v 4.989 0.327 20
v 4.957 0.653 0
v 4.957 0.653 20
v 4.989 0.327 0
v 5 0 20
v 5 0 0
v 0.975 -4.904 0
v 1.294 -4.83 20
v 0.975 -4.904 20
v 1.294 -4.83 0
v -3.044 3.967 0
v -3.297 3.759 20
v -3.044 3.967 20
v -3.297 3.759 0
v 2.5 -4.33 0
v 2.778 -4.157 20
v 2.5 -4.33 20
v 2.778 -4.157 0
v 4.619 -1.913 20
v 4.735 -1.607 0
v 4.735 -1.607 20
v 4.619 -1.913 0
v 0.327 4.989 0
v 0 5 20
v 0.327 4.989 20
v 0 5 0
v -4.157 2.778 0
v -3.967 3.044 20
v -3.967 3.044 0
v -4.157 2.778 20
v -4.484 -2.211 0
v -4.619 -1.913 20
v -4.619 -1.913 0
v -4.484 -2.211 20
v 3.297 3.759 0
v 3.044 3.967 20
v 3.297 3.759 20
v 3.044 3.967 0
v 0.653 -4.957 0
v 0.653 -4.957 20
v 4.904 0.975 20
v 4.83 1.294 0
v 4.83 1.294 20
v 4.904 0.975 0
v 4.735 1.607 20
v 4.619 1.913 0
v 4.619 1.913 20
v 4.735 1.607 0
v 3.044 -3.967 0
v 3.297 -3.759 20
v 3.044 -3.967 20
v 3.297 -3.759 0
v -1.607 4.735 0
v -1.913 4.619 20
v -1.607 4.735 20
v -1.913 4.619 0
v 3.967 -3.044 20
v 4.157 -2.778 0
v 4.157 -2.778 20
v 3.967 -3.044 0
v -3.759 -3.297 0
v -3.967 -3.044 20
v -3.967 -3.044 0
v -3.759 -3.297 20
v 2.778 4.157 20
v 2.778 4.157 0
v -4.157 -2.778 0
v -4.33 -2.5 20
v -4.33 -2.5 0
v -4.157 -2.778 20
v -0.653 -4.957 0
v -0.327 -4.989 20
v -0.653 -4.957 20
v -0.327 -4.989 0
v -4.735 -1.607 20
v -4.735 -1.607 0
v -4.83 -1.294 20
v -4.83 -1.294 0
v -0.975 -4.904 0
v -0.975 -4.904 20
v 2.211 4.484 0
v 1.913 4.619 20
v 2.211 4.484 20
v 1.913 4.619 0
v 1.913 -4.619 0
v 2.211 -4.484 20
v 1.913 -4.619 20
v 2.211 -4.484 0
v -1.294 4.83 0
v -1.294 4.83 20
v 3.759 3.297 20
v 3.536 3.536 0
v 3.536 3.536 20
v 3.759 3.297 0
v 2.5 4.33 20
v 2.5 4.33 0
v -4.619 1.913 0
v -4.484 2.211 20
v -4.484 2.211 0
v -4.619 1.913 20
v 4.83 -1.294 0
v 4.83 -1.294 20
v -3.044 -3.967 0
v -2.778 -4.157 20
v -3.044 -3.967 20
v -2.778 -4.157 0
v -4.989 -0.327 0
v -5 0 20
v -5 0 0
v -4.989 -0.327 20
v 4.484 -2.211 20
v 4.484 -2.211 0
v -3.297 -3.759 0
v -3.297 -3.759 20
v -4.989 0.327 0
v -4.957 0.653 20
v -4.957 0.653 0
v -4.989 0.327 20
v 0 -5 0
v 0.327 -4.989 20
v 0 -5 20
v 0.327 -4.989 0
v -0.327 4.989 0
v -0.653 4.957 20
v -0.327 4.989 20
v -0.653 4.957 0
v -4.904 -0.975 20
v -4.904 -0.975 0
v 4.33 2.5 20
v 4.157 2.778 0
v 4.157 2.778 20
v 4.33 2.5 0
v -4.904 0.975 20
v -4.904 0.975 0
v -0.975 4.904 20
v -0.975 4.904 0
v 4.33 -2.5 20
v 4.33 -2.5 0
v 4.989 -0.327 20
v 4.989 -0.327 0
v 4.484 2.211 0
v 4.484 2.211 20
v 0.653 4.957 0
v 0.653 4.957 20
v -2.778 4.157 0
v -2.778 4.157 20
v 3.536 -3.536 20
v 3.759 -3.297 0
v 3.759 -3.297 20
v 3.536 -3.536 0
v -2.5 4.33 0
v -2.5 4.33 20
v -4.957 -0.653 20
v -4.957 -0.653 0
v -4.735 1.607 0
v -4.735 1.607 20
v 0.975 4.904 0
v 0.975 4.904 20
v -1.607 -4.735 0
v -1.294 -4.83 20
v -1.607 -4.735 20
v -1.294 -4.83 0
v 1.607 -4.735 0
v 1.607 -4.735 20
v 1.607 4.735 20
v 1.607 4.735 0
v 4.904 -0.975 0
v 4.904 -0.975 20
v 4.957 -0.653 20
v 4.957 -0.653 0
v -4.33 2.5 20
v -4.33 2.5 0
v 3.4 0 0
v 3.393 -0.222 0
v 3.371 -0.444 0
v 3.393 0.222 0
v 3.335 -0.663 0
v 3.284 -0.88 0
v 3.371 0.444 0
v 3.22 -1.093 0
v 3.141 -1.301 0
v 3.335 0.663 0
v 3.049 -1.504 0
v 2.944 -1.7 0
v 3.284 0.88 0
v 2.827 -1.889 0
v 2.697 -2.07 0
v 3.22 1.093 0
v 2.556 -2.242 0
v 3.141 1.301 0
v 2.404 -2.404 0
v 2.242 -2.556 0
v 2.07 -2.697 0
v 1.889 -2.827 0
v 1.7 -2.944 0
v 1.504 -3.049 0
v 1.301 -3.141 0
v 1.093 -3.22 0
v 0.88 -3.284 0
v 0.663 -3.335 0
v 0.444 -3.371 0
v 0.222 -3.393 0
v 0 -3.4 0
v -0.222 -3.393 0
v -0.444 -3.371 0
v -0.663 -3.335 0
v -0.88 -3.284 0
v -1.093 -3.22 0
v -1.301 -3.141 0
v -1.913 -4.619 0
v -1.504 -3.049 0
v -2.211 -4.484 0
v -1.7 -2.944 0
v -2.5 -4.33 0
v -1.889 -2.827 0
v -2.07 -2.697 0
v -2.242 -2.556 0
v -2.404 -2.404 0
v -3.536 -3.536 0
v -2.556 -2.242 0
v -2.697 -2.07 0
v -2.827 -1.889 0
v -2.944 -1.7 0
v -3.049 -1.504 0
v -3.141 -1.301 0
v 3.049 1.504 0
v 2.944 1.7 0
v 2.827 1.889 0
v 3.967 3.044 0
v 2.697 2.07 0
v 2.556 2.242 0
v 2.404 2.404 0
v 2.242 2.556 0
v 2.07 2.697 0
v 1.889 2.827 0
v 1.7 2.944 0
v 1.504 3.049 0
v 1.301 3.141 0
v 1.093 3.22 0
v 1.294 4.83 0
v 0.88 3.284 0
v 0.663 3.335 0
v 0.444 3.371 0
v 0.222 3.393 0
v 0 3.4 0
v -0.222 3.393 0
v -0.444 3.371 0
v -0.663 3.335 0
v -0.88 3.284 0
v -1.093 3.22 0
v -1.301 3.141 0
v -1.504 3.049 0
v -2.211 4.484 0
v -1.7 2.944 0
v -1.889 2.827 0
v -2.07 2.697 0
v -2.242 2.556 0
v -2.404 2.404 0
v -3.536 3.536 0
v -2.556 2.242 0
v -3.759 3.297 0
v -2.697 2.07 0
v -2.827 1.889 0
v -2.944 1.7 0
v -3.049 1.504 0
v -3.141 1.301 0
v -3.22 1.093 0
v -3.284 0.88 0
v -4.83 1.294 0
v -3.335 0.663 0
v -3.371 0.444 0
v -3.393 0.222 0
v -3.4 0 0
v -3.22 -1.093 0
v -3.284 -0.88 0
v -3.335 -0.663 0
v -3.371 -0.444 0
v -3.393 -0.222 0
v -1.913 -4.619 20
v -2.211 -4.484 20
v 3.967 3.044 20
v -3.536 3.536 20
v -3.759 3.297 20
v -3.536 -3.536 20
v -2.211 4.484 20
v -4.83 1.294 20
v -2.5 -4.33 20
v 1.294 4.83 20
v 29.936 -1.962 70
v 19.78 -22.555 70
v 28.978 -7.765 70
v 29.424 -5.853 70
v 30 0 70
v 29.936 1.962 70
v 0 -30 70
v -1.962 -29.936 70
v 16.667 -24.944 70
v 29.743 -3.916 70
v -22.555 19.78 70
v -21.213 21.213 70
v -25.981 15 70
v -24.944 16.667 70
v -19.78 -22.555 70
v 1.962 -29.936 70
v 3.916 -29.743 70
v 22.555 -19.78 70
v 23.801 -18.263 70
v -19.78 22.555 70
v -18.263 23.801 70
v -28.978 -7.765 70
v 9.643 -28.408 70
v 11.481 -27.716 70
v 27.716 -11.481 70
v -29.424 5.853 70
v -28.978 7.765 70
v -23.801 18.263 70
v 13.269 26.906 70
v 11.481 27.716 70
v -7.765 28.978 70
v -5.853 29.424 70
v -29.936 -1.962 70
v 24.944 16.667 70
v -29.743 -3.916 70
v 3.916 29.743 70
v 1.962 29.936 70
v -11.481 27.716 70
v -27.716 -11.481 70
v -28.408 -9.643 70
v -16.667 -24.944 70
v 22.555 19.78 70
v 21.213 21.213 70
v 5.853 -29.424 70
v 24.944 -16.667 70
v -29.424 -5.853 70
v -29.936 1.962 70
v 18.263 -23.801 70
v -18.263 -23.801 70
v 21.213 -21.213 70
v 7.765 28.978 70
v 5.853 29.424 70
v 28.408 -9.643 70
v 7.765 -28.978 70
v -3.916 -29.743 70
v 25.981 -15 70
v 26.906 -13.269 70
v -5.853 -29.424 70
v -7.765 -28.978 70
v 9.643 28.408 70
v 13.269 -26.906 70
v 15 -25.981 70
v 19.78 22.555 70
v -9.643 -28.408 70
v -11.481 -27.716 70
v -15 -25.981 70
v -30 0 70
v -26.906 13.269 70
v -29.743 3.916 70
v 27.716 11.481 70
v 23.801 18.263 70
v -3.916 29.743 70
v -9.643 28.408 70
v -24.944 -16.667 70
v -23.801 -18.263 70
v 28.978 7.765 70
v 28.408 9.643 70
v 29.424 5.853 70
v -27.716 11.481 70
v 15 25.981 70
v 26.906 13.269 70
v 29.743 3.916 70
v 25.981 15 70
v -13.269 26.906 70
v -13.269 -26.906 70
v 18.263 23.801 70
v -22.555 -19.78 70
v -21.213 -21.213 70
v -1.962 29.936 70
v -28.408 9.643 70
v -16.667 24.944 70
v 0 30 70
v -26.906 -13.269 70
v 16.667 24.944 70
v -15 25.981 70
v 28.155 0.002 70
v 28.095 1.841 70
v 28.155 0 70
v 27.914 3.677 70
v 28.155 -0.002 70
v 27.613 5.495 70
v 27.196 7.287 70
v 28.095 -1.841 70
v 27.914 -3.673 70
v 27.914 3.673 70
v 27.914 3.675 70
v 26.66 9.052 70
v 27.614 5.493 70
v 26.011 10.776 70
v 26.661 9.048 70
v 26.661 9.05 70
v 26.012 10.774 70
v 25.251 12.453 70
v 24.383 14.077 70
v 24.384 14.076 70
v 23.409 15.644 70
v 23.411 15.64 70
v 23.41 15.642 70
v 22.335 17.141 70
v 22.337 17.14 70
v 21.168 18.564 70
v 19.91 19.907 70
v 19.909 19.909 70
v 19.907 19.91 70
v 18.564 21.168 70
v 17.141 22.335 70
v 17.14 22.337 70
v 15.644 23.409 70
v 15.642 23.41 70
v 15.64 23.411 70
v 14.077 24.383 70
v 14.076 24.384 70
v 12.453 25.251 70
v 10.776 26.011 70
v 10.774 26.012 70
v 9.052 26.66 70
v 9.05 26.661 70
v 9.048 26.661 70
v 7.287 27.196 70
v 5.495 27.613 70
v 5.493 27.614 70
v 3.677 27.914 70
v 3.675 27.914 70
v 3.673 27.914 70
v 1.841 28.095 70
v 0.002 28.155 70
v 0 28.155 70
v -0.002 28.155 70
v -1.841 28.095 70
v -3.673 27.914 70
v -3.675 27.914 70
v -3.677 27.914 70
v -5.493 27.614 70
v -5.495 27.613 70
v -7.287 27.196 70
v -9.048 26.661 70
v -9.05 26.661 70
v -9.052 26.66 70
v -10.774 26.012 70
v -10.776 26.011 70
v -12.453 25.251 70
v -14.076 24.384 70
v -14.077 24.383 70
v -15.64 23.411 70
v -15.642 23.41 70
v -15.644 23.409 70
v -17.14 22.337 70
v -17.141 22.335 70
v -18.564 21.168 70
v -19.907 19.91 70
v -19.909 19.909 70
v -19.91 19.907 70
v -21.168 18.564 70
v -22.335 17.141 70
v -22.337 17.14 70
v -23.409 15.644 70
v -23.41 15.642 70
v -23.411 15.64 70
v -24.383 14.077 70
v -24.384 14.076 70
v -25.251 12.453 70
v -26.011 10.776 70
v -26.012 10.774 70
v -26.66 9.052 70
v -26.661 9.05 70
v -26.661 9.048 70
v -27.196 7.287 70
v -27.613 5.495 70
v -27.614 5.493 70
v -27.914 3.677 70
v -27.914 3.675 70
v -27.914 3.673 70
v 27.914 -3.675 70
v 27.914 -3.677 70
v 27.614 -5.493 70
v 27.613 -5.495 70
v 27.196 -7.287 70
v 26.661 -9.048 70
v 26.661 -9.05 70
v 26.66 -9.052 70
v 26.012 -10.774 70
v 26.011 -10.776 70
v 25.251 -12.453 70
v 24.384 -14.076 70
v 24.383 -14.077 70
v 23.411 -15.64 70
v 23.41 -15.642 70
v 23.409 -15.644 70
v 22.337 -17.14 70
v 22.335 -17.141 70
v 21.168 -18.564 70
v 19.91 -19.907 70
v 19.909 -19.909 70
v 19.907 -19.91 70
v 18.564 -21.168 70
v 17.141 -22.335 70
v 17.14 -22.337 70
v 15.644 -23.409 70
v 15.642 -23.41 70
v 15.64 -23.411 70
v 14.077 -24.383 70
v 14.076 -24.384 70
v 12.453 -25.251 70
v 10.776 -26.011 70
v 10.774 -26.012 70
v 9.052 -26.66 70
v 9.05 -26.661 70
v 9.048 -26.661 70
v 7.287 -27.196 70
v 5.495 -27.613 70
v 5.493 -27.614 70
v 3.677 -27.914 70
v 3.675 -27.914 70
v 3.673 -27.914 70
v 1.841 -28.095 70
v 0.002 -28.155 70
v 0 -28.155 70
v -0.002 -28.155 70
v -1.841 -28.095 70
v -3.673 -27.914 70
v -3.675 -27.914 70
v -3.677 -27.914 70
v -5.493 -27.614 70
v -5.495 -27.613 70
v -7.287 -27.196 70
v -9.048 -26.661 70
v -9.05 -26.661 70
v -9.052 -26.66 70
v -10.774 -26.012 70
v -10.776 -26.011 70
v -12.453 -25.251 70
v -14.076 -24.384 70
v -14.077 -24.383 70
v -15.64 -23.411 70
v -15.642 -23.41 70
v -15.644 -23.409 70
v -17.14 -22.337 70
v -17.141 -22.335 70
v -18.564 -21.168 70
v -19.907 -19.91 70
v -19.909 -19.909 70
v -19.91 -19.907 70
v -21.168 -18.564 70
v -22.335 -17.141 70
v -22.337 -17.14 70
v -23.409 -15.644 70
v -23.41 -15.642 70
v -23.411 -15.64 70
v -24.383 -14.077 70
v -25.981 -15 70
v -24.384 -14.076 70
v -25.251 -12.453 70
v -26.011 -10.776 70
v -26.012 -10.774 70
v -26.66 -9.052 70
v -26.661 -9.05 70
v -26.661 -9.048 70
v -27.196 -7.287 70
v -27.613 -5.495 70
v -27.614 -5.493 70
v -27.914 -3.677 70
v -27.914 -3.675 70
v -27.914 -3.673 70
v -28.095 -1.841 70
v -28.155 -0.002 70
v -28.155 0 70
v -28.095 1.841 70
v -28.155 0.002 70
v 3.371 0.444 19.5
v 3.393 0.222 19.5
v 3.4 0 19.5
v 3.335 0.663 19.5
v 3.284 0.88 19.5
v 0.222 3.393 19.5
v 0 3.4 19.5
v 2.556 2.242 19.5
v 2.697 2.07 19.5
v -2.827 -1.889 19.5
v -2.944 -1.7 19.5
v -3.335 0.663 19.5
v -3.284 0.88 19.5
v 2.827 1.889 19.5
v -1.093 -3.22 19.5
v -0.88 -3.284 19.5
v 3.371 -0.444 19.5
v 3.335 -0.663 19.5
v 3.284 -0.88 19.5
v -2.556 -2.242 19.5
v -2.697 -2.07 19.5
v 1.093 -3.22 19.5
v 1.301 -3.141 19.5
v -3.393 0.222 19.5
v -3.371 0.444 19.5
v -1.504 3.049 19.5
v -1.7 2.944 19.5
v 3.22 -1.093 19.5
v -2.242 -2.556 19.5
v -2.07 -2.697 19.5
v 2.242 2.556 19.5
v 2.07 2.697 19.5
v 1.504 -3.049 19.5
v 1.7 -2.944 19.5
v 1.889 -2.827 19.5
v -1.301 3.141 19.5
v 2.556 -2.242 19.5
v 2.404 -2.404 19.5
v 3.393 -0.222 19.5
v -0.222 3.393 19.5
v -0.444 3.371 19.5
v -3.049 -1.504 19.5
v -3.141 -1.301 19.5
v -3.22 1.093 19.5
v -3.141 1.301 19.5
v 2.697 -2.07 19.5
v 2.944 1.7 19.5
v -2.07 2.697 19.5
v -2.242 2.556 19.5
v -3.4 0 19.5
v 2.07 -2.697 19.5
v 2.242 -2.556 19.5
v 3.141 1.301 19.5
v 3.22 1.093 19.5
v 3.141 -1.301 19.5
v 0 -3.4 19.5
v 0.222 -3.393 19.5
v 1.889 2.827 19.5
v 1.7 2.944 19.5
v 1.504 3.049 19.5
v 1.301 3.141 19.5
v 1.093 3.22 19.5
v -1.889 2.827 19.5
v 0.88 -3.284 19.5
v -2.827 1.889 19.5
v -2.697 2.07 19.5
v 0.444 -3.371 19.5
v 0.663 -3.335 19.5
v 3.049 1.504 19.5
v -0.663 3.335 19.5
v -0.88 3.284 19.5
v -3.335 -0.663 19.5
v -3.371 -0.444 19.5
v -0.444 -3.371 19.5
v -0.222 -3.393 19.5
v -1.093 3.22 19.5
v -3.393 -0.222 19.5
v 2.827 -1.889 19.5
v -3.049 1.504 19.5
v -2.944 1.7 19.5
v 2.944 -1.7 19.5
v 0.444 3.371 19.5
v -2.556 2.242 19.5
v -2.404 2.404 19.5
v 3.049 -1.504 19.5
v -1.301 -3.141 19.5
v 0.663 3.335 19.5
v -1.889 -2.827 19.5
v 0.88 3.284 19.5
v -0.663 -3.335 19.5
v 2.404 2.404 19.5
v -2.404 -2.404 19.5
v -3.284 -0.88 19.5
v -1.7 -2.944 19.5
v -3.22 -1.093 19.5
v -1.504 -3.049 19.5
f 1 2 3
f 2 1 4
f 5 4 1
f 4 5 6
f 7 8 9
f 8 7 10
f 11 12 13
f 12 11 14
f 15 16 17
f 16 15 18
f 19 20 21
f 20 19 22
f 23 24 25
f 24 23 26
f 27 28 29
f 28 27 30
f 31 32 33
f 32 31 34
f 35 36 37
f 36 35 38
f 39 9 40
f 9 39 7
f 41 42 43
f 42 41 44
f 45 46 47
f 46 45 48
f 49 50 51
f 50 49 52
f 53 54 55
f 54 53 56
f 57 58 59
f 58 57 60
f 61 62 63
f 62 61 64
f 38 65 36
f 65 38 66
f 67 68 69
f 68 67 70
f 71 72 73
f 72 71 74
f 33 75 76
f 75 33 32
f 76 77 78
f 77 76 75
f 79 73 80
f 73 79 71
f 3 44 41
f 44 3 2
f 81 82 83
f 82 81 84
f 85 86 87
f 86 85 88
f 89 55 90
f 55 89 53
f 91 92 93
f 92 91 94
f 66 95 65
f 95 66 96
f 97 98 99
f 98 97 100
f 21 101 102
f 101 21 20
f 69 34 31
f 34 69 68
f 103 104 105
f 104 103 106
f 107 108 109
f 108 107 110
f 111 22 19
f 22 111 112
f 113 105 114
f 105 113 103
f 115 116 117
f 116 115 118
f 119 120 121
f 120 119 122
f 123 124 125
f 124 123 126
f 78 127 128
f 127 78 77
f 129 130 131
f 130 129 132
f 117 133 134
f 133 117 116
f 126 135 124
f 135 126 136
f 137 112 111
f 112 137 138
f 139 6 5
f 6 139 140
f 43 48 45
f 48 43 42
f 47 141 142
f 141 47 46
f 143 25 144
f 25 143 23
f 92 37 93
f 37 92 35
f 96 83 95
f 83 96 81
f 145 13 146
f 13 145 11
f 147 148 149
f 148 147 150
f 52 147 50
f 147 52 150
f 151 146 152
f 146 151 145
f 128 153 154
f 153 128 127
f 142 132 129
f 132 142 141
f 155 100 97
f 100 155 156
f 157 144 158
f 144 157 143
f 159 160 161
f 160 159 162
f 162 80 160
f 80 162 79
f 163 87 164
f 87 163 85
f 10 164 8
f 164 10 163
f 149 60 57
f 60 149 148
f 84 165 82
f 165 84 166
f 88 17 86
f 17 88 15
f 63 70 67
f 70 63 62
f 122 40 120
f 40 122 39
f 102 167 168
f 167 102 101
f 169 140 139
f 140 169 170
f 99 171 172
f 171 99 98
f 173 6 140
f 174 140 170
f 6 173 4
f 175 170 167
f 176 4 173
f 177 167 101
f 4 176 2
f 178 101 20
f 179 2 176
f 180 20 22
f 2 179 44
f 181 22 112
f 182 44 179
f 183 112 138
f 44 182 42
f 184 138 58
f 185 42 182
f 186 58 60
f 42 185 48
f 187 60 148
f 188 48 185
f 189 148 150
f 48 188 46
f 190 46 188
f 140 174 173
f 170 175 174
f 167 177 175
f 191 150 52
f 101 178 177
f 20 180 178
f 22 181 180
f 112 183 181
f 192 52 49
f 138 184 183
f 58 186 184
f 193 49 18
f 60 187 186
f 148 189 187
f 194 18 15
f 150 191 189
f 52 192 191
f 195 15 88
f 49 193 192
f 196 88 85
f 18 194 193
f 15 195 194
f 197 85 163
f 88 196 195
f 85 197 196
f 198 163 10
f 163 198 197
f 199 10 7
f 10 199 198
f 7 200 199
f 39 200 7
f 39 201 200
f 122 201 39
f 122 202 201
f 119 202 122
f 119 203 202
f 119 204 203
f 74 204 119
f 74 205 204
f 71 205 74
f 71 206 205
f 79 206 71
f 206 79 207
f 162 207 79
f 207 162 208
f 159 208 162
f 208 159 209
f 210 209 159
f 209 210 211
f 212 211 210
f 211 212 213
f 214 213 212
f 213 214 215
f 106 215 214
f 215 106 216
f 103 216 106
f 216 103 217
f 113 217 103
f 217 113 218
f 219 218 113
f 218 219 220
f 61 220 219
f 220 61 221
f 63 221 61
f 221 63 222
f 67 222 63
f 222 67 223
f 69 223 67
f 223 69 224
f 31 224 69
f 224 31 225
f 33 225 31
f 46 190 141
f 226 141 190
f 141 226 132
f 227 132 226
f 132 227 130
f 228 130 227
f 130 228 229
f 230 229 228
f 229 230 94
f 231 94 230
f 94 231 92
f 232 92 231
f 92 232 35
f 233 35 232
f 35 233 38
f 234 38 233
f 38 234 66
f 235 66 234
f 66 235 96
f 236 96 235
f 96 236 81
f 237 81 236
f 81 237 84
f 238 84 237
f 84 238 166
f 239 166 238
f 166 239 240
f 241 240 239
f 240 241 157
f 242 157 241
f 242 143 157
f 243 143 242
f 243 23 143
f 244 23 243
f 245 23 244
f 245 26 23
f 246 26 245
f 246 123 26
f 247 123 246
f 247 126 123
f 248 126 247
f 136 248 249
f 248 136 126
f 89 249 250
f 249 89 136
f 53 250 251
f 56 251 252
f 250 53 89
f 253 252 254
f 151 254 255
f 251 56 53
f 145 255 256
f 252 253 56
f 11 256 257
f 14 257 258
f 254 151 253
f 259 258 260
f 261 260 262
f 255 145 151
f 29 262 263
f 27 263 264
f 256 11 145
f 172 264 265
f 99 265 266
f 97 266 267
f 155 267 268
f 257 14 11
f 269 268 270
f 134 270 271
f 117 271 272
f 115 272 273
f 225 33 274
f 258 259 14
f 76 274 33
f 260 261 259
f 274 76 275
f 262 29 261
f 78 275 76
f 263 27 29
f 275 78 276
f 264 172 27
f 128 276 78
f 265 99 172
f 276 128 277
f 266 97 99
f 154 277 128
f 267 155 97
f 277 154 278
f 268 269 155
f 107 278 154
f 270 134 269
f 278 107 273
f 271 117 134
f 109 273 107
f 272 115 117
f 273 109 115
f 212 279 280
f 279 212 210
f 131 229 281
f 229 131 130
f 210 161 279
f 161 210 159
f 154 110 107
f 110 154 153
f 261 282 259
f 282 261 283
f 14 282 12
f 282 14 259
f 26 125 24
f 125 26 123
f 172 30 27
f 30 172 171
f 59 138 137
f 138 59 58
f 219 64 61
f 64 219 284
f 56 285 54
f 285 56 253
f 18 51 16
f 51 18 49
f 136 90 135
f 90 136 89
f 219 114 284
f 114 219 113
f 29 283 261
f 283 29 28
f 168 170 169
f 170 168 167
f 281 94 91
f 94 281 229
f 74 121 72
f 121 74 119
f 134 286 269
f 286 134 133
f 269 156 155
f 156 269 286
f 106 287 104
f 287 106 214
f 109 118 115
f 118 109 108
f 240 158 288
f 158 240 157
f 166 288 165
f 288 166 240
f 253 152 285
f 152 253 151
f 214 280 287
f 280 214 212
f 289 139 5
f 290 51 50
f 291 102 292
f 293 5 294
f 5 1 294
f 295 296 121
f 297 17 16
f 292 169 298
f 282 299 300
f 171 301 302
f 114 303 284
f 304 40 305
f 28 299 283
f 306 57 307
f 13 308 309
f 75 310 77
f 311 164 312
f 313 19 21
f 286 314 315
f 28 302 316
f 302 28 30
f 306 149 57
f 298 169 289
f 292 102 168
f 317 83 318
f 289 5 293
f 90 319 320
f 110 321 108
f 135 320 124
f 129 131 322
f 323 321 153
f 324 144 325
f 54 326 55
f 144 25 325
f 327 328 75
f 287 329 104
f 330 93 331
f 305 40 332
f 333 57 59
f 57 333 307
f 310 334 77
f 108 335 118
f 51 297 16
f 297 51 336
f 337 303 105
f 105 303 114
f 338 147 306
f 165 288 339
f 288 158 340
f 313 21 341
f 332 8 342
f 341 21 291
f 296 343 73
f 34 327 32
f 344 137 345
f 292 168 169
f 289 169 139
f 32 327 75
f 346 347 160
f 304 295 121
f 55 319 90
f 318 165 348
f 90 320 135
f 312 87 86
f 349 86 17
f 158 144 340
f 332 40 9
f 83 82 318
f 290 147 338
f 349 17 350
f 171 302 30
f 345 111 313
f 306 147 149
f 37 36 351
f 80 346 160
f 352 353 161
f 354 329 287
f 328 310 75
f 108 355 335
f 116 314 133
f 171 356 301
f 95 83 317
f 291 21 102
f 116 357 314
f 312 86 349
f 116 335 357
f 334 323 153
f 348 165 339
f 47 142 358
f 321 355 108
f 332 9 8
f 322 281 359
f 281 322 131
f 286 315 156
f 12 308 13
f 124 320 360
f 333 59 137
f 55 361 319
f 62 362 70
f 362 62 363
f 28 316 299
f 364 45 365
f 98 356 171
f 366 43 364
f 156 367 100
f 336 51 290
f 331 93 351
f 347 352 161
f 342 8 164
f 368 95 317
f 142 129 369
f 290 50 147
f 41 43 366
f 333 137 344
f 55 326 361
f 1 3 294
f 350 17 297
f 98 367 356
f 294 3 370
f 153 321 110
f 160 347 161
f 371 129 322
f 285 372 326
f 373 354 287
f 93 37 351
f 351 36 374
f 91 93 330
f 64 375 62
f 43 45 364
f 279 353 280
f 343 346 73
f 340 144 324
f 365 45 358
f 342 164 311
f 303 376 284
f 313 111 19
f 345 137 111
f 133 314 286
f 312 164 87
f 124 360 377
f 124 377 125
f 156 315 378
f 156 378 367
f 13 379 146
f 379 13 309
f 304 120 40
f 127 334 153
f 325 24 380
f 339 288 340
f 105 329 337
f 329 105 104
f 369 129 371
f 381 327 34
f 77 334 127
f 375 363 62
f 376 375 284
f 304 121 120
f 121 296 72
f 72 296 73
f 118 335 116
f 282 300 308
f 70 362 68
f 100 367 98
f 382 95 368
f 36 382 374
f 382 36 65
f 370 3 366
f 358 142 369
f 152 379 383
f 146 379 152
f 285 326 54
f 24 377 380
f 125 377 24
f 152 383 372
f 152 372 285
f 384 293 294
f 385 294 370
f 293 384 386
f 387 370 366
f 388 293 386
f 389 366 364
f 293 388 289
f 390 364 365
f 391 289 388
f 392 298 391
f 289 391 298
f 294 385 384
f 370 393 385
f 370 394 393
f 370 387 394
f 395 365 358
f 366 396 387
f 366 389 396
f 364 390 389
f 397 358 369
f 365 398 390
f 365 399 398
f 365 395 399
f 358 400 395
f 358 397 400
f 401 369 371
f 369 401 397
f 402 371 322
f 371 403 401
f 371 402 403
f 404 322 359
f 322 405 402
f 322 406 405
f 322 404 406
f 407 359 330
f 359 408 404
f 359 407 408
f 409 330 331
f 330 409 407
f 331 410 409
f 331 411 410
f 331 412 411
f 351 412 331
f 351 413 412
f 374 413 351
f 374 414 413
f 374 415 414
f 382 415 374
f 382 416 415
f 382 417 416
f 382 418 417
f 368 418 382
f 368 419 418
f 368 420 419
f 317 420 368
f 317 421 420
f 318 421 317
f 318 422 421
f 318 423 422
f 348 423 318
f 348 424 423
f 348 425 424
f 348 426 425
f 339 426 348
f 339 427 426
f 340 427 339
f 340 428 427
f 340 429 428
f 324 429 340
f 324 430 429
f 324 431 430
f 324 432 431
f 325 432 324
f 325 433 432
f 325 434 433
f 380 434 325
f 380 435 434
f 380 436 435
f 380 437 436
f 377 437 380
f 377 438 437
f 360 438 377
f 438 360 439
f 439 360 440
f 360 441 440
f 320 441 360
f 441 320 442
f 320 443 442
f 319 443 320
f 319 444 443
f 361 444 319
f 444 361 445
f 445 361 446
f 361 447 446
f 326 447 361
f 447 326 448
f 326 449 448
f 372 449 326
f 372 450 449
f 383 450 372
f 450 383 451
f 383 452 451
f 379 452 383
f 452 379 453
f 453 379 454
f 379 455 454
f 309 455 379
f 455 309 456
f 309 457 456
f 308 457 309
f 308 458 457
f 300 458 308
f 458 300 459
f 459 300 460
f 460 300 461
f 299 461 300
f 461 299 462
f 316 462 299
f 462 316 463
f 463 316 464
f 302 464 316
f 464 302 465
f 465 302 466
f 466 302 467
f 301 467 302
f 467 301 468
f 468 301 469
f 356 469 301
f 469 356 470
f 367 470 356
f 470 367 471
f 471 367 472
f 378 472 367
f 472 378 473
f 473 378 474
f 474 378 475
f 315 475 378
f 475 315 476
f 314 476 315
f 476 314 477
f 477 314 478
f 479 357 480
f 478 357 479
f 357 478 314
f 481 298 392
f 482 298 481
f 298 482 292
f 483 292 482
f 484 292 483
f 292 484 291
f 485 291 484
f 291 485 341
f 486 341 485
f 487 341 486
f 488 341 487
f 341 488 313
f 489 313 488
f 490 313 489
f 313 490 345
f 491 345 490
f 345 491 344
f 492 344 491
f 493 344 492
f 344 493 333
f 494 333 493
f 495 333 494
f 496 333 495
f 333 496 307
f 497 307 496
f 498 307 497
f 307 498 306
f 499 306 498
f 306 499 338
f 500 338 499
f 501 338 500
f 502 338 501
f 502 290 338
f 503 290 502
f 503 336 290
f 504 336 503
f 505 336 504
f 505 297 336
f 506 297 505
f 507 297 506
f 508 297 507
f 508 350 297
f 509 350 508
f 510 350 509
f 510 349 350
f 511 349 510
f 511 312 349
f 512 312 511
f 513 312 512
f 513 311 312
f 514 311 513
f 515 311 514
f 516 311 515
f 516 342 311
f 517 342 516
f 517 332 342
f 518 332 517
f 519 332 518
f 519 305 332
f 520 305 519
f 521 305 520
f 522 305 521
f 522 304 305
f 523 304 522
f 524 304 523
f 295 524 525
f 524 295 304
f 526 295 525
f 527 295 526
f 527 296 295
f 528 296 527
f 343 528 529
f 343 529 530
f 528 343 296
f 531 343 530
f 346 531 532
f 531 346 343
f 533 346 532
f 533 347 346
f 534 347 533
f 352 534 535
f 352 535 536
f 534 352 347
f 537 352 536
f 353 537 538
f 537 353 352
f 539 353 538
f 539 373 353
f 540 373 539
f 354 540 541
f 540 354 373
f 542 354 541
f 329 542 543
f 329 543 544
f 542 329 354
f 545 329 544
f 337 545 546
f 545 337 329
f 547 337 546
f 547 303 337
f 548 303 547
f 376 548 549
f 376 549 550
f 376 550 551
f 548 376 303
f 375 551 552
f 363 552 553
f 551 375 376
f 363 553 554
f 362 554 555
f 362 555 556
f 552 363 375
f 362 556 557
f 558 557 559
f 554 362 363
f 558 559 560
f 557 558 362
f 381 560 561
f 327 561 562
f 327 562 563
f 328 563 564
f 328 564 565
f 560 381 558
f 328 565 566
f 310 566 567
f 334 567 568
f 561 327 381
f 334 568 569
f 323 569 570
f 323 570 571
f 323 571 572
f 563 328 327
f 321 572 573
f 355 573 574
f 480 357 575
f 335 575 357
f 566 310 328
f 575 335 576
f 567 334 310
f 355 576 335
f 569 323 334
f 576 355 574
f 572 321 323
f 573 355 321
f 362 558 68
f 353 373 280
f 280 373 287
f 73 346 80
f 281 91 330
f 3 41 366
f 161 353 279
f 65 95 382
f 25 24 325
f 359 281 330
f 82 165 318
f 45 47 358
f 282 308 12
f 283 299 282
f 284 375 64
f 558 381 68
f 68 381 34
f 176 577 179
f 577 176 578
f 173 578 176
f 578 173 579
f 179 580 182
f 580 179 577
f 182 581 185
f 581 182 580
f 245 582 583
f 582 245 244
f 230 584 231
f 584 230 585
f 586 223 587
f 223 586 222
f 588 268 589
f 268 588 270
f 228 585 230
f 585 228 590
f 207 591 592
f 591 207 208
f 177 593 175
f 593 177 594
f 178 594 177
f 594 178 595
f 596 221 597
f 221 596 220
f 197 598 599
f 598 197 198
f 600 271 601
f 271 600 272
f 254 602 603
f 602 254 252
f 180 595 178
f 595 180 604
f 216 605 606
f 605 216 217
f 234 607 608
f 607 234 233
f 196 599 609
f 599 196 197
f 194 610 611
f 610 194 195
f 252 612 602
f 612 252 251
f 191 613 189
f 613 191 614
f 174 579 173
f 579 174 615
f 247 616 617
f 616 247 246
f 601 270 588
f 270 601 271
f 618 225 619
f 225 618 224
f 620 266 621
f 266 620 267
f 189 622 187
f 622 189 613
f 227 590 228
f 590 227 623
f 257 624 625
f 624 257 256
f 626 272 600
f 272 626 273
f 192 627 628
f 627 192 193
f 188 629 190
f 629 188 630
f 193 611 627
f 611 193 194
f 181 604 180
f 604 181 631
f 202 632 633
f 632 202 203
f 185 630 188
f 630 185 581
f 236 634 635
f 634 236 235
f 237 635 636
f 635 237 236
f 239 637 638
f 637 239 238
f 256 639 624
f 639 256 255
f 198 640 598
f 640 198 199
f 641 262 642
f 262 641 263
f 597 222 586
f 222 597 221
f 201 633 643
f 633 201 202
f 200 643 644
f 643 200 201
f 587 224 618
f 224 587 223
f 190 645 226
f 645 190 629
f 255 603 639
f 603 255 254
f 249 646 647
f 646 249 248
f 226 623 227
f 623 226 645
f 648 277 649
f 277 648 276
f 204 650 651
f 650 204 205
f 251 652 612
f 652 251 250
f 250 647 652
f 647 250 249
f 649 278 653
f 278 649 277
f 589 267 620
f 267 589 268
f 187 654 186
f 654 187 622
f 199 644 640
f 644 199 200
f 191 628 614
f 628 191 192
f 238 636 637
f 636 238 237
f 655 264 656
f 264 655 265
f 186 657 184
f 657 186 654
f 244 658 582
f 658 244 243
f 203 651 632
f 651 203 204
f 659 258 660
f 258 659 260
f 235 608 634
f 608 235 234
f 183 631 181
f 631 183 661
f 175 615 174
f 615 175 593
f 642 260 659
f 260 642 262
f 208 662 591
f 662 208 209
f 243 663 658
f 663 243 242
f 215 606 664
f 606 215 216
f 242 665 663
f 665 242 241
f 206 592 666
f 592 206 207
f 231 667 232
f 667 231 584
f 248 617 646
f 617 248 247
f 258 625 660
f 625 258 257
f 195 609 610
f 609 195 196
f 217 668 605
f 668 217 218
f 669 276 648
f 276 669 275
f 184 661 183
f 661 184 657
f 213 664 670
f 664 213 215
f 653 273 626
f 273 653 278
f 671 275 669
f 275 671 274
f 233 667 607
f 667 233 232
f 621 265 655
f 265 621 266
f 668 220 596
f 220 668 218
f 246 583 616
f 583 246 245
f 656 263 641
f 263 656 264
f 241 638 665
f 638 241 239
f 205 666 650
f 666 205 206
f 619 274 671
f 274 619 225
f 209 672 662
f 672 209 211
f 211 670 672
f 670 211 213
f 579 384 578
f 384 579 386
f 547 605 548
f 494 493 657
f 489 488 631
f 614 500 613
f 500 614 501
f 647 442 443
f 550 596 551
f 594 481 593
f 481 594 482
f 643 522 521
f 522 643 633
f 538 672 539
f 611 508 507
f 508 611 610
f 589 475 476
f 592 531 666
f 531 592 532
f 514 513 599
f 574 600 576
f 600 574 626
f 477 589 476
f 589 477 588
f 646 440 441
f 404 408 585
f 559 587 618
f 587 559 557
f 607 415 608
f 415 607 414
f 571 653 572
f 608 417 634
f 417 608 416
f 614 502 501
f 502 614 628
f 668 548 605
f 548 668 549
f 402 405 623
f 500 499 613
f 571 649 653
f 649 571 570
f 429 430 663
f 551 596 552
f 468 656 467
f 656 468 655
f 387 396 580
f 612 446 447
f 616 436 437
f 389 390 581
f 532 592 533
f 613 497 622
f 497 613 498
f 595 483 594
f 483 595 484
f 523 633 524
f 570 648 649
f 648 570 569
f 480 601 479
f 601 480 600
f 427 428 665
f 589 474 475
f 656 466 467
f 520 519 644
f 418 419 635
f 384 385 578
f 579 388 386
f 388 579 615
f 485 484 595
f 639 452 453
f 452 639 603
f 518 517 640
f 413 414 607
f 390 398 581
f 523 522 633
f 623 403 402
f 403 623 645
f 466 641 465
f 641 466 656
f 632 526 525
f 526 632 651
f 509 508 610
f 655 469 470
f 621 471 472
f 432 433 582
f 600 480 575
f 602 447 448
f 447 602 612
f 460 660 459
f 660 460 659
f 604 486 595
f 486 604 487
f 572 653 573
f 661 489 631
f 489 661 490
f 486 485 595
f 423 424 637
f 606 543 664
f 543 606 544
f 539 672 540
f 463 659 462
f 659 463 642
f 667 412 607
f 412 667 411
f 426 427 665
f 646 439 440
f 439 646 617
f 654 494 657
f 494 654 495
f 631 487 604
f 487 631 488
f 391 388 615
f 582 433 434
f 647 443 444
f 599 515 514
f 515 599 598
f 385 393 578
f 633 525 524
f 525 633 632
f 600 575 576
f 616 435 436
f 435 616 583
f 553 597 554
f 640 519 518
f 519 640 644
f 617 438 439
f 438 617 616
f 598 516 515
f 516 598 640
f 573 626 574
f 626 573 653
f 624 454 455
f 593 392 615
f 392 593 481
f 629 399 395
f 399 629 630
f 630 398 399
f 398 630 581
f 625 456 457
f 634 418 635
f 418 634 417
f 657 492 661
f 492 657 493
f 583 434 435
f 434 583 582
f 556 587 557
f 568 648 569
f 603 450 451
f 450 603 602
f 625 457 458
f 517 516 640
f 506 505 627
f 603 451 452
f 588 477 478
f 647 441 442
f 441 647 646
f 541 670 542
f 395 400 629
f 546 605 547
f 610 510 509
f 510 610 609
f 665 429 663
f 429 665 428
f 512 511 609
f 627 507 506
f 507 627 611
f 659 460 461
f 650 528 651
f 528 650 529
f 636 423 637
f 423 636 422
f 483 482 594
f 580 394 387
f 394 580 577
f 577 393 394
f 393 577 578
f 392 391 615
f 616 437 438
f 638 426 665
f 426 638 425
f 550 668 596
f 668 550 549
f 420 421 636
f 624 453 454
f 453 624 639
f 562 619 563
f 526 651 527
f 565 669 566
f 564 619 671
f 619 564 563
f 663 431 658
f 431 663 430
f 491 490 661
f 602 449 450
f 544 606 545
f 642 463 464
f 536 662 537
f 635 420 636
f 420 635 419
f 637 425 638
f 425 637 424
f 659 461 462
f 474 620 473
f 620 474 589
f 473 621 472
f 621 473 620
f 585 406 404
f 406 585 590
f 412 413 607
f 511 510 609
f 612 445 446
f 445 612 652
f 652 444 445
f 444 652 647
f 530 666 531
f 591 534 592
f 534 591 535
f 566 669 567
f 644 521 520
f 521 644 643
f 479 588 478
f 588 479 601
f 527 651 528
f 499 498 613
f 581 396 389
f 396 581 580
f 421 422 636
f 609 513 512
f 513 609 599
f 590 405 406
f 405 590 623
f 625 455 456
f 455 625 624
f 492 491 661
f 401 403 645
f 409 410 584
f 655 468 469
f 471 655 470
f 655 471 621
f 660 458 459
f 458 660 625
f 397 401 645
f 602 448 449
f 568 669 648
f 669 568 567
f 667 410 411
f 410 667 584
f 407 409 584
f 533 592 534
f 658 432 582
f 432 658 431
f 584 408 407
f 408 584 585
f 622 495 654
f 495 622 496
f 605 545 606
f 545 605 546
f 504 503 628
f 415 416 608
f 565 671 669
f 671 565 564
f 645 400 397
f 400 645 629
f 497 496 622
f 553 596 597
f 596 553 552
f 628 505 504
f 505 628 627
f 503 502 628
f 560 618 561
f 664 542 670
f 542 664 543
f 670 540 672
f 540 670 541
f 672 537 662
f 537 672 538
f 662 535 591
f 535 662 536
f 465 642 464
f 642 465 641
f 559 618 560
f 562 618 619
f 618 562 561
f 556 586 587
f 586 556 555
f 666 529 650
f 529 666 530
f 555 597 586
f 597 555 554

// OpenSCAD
// Lab funnel - printed upright, open top and bottom
// Units: mm

// ---- Parameters ----
spout_od      = 10;    // spout outer diameter
spout_length  = 20;    // spout runs from z = 0 to z = 20
cone_top_d    = 60;    // cone rim diameter at z = 50
cone_bottom_d = 10;    // cone diameter where it meets the spout (z = 20)
wall          = 1.6;   // wall thickness everywhere
eps           = 0.5;   // cutter overshoot past faces

$fn = 96;

// ---- Model ----
difference() {
    union() {
        // Straight spout (tube)
        cylinder(d = spout_od, h = spout_length);
        // Cone from z = 20 to z = 50
        translate([0, 0, spout_length])
            cylinder(d1 = cone_bottom_d, d2 = cone_top_d, h = cone_top_d - cone_bottom_d);
    }
    // Through-bore: spout bore + cone bore (open bottom)
    translate([0, 0, -eps])
        cylinder(h = spout_length + 2 * eps, d = spout_od - 2 * wall);
    translate([0, 0, spout_length - eps])
        cylinder(h = (cone_top_d - cone_bottom_d) + 2 * eps,
                 d1 = cone_bottom_d - 2 * wall,
                 d2 = cone_top_d - 2 * wall);
}
